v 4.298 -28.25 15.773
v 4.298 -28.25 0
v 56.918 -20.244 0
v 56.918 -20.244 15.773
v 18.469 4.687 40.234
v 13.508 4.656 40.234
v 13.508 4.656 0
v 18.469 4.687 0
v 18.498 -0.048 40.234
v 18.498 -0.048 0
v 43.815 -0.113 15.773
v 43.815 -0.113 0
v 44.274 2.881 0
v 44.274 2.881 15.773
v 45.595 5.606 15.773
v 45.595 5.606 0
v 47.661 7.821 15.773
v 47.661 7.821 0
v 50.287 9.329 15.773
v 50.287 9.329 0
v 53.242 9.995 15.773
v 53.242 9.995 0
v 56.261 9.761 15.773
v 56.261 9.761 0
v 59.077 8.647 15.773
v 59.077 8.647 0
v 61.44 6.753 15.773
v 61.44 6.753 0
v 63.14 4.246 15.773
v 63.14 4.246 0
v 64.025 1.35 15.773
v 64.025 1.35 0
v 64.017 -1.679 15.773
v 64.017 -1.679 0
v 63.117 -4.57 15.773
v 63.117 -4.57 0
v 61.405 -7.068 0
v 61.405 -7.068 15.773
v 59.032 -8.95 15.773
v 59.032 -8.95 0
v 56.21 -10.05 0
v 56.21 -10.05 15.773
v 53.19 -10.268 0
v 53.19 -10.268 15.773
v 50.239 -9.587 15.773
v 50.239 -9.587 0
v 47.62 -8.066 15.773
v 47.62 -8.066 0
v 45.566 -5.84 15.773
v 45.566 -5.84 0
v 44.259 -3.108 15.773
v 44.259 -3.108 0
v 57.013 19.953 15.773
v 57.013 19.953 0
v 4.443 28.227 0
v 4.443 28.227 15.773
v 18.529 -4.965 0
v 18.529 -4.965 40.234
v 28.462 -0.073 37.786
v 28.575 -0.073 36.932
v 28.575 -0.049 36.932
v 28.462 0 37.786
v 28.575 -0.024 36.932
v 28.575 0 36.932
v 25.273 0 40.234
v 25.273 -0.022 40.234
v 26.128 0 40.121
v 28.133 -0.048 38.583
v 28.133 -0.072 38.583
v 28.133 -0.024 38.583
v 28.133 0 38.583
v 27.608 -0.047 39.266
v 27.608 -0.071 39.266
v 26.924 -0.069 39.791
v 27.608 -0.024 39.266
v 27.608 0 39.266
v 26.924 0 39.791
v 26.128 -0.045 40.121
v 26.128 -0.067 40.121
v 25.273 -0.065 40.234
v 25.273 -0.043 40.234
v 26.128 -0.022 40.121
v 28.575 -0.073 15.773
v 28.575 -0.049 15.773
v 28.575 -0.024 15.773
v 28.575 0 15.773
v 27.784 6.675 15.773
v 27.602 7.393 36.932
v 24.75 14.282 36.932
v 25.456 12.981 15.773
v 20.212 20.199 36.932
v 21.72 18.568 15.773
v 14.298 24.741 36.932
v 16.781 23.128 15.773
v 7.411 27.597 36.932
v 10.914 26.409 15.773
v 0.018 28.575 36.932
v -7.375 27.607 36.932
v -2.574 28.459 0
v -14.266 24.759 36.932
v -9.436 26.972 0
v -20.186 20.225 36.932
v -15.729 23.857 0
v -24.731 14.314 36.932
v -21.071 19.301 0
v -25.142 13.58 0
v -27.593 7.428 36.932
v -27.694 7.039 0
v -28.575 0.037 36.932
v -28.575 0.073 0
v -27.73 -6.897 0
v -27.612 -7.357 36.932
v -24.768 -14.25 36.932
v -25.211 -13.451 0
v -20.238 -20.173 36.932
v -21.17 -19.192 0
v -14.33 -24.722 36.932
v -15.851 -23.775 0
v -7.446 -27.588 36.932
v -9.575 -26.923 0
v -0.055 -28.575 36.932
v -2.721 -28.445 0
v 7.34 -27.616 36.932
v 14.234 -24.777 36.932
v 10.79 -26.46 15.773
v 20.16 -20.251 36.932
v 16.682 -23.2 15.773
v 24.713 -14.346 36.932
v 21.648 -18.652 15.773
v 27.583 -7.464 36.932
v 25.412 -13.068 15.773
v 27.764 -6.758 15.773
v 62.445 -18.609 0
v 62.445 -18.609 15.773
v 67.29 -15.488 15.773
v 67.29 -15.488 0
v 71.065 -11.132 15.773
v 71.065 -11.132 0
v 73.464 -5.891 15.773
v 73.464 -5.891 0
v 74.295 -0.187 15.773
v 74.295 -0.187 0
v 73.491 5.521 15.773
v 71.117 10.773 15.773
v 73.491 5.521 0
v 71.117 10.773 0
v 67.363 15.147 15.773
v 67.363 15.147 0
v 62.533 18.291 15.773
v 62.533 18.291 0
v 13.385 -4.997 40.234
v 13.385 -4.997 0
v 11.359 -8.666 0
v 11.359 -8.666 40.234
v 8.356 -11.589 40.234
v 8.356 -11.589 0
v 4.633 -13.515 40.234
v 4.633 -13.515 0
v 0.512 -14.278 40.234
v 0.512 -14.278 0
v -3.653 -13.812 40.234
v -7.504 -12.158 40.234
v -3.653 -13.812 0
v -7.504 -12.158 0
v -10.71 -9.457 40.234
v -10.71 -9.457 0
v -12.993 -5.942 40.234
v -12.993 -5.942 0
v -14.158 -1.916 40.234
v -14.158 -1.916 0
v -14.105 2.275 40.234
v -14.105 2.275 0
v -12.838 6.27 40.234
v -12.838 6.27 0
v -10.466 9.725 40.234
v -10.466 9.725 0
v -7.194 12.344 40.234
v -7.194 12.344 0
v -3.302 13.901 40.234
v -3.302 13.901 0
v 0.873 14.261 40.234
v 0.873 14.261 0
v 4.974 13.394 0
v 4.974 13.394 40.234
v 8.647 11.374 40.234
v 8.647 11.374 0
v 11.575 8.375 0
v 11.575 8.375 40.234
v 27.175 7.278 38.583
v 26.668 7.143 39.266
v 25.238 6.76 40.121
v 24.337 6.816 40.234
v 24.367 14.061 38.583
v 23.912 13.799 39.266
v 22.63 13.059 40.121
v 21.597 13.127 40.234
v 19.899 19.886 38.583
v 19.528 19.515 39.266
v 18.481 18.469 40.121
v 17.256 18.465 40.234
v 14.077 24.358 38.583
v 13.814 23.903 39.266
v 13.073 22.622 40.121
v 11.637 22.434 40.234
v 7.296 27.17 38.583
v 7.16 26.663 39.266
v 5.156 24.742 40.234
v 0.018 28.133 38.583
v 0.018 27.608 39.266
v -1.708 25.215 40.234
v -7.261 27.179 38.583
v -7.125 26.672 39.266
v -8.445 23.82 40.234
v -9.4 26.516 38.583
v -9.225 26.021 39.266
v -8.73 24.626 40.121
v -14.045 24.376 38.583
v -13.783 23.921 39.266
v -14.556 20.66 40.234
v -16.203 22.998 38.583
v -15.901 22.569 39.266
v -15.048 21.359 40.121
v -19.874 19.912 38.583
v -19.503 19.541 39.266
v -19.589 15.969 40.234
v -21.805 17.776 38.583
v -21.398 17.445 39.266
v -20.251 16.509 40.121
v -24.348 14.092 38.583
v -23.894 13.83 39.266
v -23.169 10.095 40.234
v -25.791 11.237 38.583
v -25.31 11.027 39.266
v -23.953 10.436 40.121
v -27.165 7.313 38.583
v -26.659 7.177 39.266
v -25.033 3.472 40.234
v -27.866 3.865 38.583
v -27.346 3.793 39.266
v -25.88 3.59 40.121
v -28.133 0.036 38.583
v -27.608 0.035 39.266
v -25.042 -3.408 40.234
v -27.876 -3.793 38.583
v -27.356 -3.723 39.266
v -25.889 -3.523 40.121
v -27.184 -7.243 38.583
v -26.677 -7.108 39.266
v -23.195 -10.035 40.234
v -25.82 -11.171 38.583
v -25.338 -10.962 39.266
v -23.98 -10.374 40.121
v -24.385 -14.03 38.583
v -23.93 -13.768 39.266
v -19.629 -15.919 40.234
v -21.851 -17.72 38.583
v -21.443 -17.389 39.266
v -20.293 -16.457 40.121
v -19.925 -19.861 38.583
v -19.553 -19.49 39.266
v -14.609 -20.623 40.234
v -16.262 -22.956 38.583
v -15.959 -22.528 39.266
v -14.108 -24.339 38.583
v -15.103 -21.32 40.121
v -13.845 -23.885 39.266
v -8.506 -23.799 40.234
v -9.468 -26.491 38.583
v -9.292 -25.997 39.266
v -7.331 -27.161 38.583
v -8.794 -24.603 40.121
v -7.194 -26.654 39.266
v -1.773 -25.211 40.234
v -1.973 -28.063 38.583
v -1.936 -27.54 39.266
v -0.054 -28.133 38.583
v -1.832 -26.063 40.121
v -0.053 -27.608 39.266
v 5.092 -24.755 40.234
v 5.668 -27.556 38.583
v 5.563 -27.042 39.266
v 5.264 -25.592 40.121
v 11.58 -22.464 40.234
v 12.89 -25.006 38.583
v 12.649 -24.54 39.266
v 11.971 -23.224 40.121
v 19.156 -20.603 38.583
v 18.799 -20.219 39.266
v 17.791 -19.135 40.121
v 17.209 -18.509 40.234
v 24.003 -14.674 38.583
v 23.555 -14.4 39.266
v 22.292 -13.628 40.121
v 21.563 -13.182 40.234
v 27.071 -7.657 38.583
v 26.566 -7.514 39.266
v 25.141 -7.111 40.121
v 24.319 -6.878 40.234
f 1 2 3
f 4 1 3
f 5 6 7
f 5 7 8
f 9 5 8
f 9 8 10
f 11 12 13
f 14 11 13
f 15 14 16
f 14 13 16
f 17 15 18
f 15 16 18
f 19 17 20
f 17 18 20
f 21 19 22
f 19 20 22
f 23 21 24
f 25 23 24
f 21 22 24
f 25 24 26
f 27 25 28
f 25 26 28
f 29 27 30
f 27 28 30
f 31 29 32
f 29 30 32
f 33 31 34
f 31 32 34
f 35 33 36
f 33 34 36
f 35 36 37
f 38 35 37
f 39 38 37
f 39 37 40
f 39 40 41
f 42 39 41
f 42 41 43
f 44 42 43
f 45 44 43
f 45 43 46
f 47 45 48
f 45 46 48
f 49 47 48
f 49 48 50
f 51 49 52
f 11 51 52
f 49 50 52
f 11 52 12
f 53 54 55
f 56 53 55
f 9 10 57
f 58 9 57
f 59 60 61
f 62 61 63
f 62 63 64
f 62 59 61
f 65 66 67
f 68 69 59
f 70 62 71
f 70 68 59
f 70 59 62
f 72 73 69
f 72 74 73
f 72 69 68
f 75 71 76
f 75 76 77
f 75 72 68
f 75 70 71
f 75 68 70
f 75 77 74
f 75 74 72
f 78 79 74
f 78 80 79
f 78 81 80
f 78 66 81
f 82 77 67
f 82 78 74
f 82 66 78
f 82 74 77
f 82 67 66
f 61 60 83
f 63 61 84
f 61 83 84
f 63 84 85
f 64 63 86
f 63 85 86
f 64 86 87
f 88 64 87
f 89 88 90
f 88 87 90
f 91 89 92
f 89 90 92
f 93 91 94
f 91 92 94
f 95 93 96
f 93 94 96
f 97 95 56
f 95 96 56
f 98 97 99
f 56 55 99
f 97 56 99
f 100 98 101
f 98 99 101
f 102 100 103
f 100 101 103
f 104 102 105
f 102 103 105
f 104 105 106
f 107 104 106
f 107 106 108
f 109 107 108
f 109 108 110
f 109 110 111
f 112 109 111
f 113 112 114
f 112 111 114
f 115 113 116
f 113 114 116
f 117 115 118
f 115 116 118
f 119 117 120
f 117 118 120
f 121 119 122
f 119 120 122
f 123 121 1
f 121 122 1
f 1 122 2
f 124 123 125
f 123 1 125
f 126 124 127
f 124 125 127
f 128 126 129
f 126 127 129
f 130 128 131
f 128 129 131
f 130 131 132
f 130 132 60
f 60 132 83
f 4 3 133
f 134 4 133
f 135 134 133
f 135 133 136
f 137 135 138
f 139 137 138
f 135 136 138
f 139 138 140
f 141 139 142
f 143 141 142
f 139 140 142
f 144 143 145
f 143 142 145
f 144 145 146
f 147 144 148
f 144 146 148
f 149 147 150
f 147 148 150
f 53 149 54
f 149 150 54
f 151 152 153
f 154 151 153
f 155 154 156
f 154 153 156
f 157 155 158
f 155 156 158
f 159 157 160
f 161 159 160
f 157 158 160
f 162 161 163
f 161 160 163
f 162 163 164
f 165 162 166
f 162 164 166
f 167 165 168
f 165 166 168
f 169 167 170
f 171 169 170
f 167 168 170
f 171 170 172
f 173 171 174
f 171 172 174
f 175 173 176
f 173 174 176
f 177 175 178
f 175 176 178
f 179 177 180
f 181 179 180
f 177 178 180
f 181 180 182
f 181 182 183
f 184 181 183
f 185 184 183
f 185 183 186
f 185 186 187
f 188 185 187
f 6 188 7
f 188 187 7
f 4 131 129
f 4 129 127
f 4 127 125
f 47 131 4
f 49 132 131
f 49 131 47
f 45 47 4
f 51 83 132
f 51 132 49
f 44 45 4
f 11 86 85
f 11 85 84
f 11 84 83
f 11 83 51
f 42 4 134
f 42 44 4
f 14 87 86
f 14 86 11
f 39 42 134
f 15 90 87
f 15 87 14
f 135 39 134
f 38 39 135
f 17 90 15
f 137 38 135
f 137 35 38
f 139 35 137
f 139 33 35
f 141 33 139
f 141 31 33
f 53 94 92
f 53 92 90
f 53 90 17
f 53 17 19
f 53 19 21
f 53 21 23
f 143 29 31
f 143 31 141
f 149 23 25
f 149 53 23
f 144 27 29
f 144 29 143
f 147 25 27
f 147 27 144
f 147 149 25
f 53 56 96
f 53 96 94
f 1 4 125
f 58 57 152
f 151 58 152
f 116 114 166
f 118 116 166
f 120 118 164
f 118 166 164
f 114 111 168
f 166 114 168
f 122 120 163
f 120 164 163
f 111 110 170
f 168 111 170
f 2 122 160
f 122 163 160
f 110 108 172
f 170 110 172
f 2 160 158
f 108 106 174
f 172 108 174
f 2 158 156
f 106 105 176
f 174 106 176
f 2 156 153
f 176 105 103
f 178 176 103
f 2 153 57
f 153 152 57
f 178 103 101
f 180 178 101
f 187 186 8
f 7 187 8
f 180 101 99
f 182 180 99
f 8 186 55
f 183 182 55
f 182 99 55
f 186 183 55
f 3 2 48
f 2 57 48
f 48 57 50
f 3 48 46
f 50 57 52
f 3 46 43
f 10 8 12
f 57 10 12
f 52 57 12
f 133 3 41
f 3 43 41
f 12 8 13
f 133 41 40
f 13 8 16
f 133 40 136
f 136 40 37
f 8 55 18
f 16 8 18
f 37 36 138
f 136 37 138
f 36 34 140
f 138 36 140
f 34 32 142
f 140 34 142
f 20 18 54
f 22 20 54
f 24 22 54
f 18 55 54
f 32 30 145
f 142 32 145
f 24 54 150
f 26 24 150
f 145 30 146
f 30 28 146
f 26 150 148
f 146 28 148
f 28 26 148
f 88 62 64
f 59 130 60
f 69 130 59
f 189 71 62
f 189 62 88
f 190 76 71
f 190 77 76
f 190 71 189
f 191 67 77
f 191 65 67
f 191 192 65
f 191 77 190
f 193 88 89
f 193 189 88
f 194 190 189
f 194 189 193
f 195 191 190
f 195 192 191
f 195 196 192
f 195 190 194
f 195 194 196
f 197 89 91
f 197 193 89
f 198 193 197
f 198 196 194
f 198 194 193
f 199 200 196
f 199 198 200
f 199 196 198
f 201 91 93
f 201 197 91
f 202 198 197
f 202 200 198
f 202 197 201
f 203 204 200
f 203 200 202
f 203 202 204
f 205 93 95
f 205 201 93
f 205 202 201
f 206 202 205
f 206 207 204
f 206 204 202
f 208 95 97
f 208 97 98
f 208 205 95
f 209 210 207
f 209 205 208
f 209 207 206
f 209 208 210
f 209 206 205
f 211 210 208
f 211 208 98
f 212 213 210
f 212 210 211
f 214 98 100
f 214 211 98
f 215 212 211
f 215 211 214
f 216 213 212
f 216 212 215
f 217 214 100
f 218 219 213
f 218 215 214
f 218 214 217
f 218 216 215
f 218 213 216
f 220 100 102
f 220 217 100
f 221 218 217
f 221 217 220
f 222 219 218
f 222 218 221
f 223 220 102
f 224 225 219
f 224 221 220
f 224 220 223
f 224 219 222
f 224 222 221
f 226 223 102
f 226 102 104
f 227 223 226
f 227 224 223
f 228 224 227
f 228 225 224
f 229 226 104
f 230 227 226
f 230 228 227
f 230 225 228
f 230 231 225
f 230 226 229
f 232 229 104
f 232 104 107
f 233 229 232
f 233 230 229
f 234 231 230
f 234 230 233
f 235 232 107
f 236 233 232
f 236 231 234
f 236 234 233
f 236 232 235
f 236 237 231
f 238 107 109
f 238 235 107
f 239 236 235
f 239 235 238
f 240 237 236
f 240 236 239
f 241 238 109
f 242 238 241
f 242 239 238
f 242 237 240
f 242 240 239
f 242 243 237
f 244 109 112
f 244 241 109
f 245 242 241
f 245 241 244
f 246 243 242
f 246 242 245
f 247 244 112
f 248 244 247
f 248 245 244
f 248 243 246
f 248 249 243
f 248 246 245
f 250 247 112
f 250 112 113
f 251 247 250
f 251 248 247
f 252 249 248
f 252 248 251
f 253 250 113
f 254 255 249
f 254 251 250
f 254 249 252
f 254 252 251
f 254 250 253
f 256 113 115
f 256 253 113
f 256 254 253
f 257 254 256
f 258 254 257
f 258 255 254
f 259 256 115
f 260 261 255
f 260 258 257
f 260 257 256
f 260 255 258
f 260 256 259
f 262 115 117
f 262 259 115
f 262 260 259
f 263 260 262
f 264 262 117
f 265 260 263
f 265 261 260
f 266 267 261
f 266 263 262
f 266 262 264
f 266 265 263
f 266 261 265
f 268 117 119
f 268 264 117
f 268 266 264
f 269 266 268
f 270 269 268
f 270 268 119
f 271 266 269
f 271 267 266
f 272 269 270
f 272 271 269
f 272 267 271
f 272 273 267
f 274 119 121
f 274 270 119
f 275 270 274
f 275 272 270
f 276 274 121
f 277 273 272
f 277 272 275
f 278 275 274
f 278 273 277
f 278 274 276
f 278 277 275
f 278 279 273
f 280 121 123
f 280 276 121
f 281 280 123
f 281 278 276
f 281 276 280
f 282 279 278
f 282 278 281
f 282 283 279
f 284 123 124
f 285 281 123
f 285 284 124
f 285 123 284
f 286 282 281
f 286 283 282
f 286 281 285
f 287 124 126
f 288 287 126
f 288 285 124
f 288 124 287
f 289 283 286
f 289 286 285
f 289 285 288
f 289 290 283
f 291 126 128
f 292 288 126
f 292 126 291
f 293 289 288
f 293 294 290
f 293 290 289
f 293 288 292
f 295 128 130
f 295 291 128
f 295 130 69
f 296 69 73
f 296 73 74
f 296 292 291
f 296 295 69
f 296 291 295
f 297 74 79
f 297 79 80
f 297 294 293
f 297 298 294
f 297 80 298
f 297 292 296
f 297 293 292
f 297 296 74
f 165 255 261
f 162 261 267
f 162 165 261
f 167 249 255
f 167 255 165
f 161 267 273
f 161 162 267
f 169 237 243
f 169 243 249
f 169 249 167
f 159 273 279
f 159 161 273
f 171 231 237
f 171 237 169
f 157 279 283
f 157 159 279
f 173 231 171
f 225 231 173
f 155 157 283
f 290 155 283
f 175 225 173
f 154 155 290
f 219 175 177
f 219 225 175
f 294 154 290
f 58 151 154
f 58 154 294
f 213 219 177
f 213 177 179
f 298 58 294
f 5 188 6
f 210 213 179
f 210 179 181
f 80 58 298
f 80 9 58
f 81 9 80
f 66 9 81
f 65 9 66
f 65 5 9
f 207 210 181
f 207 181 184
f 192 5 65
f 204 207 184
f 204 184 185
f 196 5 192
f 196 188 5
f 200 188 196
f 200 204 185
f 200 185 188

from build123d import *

# Parameters (mm, degrees)
F1_DEPTH = 15.7734
F2_DEPTH = 40.2336
F3_R     = 3.302


# Not quite as in the source:
# - a feature names something its author has since deleted; it is built from what else it names


with BuildPart() as f1:
    # F0 (on Top) → F1 (new body)
    with BuildSketch(Plane.XY):
        with BuildLine():
            ThreePointArc((28.5749057346, -0.0733979643), (28.5749764336, -0.0366990124), (28.575, 0))
            ThreePointArc((28.575, 0), (21.7196871584, 18.5684090525), (4.4430094671, 28.2274740612))
            ThreePointArc((4.4430094671, 28.2274740612), (-28.5749057039, 0.0734099128), (4.2979170796, -28.2499298013))
            ThreePointArc((4.2979170796, -28.2499298013), (21.6479758068, -18.6519641987), (28.5749057346, -0.0733979643))
        make_face()
        with BuildLine():
            Line((18.4686649637, 4.6872641706), (18.4984100104, -0.0475153147))
            Line((18.4984100104, -0.0475153147), (18.5293, -4.9645453691))
            Line((18.5293, -4.9645453691), (13.3852167998, -4.9968617623))
            ThreePointArc((13.3852167998, -4.9968617623), (-14.2863531341, 0.1810259026), (13.5075318215, 4.6560971147))
            Line((13.5075318215, 4.6560971147), (18.4686649637, 4.6872641706))
        make_face(mode=Mode.SUBTRACT)
        with BuildLine():
            ThreePointArc((4.4430094671, 28.2274740612), (21.7196871584, 18.5684090525), (28.575, 0))
            ThreePointArc((28.575, 0), (28.5749764336, -0.0366990124), (28.5749057346, -0.0733979643))
            ThreePointArc((28.5749057346, -0.0733979643), (21.6479758068, -18.6519641987), (4.2979170796, -28.2499298013))
            Line((4.2979170796, -28.2499298013), (56.9175468923, -20.2444300608))
            ThreePointArc((56.9175468923, -20.2444300608), (74.2947643422, -0.1870234197), (57.0132588055, 19.9529074106))
            Line((57.0132588055, 19.9529074106), (4.4430094671, 28.2274740612))
        make_face()
        with BuildLine():
            ThreePointArc((64.1348219431, -0.1386405993), (53.9617734053, -10.2986322201), (43.8148554597, -0.1125435453))
            ThreePointArc((43.8148554597, -0.1125435453), (53.9878704808, 10.0213510216), (64.1348219431, -0.1386405993))
        make_face(mode=Mode.SUBTRACT)
    extrude(amount=F1_DEPTH)

    # F0 (on Top) → F2 (join)
    with BuildSketch(Plane.XY):
        with BuildLine():
            ThreePointArc((28.5749057346, -0.0733979643), (28.5749764336, -0.0366990124), (28.575, 0))
            ThreePointArc((28.575, 0), (21.7196871584, 18.5684090525), (4.4430094671, 28.2274740612))
            ThreePointArc((4.4430094671, 28.2274740612), (-28.5749057039, 0.0734099128), (4.2979170796, -28.2499298013))
            ThreePointArc((4.2979170796, -28.2499298013), (21.6479758068, -18.6519641987), (28.5749057346, -0.0733979643))
        make_face()
        with BuildLine():
            Line((18.4686649637, 4.6872641706), (18.4984100104, -0.0475153147))
            Line((18.4984100104, -0.0475153147), (18.5293, -4.9645453691))
            Line((18.5293, -4.9645453691), (13.3852167998, -4.9968617623))
            ThreePointArc((13.3852167998, -4.9968617623), (-14.2863531341, 0.1810259026), (13.5075318215, 4.6560971147))
            Line((13.5075318215, 4.6560971147), (18.4686649637, 4.6872641706))
        make_face(mode=Mode.SUBTRACT)
    extrude(amount=F2_DEPTH)

    # F3
    f3_edges = [f1.edges().sort_by_distance(p)[0] for p in [
        (-4.297917, 28.24993, 40.2336),
    ]]
    fillet(f3_edges, radius=F3_R)


solid = f1.part
